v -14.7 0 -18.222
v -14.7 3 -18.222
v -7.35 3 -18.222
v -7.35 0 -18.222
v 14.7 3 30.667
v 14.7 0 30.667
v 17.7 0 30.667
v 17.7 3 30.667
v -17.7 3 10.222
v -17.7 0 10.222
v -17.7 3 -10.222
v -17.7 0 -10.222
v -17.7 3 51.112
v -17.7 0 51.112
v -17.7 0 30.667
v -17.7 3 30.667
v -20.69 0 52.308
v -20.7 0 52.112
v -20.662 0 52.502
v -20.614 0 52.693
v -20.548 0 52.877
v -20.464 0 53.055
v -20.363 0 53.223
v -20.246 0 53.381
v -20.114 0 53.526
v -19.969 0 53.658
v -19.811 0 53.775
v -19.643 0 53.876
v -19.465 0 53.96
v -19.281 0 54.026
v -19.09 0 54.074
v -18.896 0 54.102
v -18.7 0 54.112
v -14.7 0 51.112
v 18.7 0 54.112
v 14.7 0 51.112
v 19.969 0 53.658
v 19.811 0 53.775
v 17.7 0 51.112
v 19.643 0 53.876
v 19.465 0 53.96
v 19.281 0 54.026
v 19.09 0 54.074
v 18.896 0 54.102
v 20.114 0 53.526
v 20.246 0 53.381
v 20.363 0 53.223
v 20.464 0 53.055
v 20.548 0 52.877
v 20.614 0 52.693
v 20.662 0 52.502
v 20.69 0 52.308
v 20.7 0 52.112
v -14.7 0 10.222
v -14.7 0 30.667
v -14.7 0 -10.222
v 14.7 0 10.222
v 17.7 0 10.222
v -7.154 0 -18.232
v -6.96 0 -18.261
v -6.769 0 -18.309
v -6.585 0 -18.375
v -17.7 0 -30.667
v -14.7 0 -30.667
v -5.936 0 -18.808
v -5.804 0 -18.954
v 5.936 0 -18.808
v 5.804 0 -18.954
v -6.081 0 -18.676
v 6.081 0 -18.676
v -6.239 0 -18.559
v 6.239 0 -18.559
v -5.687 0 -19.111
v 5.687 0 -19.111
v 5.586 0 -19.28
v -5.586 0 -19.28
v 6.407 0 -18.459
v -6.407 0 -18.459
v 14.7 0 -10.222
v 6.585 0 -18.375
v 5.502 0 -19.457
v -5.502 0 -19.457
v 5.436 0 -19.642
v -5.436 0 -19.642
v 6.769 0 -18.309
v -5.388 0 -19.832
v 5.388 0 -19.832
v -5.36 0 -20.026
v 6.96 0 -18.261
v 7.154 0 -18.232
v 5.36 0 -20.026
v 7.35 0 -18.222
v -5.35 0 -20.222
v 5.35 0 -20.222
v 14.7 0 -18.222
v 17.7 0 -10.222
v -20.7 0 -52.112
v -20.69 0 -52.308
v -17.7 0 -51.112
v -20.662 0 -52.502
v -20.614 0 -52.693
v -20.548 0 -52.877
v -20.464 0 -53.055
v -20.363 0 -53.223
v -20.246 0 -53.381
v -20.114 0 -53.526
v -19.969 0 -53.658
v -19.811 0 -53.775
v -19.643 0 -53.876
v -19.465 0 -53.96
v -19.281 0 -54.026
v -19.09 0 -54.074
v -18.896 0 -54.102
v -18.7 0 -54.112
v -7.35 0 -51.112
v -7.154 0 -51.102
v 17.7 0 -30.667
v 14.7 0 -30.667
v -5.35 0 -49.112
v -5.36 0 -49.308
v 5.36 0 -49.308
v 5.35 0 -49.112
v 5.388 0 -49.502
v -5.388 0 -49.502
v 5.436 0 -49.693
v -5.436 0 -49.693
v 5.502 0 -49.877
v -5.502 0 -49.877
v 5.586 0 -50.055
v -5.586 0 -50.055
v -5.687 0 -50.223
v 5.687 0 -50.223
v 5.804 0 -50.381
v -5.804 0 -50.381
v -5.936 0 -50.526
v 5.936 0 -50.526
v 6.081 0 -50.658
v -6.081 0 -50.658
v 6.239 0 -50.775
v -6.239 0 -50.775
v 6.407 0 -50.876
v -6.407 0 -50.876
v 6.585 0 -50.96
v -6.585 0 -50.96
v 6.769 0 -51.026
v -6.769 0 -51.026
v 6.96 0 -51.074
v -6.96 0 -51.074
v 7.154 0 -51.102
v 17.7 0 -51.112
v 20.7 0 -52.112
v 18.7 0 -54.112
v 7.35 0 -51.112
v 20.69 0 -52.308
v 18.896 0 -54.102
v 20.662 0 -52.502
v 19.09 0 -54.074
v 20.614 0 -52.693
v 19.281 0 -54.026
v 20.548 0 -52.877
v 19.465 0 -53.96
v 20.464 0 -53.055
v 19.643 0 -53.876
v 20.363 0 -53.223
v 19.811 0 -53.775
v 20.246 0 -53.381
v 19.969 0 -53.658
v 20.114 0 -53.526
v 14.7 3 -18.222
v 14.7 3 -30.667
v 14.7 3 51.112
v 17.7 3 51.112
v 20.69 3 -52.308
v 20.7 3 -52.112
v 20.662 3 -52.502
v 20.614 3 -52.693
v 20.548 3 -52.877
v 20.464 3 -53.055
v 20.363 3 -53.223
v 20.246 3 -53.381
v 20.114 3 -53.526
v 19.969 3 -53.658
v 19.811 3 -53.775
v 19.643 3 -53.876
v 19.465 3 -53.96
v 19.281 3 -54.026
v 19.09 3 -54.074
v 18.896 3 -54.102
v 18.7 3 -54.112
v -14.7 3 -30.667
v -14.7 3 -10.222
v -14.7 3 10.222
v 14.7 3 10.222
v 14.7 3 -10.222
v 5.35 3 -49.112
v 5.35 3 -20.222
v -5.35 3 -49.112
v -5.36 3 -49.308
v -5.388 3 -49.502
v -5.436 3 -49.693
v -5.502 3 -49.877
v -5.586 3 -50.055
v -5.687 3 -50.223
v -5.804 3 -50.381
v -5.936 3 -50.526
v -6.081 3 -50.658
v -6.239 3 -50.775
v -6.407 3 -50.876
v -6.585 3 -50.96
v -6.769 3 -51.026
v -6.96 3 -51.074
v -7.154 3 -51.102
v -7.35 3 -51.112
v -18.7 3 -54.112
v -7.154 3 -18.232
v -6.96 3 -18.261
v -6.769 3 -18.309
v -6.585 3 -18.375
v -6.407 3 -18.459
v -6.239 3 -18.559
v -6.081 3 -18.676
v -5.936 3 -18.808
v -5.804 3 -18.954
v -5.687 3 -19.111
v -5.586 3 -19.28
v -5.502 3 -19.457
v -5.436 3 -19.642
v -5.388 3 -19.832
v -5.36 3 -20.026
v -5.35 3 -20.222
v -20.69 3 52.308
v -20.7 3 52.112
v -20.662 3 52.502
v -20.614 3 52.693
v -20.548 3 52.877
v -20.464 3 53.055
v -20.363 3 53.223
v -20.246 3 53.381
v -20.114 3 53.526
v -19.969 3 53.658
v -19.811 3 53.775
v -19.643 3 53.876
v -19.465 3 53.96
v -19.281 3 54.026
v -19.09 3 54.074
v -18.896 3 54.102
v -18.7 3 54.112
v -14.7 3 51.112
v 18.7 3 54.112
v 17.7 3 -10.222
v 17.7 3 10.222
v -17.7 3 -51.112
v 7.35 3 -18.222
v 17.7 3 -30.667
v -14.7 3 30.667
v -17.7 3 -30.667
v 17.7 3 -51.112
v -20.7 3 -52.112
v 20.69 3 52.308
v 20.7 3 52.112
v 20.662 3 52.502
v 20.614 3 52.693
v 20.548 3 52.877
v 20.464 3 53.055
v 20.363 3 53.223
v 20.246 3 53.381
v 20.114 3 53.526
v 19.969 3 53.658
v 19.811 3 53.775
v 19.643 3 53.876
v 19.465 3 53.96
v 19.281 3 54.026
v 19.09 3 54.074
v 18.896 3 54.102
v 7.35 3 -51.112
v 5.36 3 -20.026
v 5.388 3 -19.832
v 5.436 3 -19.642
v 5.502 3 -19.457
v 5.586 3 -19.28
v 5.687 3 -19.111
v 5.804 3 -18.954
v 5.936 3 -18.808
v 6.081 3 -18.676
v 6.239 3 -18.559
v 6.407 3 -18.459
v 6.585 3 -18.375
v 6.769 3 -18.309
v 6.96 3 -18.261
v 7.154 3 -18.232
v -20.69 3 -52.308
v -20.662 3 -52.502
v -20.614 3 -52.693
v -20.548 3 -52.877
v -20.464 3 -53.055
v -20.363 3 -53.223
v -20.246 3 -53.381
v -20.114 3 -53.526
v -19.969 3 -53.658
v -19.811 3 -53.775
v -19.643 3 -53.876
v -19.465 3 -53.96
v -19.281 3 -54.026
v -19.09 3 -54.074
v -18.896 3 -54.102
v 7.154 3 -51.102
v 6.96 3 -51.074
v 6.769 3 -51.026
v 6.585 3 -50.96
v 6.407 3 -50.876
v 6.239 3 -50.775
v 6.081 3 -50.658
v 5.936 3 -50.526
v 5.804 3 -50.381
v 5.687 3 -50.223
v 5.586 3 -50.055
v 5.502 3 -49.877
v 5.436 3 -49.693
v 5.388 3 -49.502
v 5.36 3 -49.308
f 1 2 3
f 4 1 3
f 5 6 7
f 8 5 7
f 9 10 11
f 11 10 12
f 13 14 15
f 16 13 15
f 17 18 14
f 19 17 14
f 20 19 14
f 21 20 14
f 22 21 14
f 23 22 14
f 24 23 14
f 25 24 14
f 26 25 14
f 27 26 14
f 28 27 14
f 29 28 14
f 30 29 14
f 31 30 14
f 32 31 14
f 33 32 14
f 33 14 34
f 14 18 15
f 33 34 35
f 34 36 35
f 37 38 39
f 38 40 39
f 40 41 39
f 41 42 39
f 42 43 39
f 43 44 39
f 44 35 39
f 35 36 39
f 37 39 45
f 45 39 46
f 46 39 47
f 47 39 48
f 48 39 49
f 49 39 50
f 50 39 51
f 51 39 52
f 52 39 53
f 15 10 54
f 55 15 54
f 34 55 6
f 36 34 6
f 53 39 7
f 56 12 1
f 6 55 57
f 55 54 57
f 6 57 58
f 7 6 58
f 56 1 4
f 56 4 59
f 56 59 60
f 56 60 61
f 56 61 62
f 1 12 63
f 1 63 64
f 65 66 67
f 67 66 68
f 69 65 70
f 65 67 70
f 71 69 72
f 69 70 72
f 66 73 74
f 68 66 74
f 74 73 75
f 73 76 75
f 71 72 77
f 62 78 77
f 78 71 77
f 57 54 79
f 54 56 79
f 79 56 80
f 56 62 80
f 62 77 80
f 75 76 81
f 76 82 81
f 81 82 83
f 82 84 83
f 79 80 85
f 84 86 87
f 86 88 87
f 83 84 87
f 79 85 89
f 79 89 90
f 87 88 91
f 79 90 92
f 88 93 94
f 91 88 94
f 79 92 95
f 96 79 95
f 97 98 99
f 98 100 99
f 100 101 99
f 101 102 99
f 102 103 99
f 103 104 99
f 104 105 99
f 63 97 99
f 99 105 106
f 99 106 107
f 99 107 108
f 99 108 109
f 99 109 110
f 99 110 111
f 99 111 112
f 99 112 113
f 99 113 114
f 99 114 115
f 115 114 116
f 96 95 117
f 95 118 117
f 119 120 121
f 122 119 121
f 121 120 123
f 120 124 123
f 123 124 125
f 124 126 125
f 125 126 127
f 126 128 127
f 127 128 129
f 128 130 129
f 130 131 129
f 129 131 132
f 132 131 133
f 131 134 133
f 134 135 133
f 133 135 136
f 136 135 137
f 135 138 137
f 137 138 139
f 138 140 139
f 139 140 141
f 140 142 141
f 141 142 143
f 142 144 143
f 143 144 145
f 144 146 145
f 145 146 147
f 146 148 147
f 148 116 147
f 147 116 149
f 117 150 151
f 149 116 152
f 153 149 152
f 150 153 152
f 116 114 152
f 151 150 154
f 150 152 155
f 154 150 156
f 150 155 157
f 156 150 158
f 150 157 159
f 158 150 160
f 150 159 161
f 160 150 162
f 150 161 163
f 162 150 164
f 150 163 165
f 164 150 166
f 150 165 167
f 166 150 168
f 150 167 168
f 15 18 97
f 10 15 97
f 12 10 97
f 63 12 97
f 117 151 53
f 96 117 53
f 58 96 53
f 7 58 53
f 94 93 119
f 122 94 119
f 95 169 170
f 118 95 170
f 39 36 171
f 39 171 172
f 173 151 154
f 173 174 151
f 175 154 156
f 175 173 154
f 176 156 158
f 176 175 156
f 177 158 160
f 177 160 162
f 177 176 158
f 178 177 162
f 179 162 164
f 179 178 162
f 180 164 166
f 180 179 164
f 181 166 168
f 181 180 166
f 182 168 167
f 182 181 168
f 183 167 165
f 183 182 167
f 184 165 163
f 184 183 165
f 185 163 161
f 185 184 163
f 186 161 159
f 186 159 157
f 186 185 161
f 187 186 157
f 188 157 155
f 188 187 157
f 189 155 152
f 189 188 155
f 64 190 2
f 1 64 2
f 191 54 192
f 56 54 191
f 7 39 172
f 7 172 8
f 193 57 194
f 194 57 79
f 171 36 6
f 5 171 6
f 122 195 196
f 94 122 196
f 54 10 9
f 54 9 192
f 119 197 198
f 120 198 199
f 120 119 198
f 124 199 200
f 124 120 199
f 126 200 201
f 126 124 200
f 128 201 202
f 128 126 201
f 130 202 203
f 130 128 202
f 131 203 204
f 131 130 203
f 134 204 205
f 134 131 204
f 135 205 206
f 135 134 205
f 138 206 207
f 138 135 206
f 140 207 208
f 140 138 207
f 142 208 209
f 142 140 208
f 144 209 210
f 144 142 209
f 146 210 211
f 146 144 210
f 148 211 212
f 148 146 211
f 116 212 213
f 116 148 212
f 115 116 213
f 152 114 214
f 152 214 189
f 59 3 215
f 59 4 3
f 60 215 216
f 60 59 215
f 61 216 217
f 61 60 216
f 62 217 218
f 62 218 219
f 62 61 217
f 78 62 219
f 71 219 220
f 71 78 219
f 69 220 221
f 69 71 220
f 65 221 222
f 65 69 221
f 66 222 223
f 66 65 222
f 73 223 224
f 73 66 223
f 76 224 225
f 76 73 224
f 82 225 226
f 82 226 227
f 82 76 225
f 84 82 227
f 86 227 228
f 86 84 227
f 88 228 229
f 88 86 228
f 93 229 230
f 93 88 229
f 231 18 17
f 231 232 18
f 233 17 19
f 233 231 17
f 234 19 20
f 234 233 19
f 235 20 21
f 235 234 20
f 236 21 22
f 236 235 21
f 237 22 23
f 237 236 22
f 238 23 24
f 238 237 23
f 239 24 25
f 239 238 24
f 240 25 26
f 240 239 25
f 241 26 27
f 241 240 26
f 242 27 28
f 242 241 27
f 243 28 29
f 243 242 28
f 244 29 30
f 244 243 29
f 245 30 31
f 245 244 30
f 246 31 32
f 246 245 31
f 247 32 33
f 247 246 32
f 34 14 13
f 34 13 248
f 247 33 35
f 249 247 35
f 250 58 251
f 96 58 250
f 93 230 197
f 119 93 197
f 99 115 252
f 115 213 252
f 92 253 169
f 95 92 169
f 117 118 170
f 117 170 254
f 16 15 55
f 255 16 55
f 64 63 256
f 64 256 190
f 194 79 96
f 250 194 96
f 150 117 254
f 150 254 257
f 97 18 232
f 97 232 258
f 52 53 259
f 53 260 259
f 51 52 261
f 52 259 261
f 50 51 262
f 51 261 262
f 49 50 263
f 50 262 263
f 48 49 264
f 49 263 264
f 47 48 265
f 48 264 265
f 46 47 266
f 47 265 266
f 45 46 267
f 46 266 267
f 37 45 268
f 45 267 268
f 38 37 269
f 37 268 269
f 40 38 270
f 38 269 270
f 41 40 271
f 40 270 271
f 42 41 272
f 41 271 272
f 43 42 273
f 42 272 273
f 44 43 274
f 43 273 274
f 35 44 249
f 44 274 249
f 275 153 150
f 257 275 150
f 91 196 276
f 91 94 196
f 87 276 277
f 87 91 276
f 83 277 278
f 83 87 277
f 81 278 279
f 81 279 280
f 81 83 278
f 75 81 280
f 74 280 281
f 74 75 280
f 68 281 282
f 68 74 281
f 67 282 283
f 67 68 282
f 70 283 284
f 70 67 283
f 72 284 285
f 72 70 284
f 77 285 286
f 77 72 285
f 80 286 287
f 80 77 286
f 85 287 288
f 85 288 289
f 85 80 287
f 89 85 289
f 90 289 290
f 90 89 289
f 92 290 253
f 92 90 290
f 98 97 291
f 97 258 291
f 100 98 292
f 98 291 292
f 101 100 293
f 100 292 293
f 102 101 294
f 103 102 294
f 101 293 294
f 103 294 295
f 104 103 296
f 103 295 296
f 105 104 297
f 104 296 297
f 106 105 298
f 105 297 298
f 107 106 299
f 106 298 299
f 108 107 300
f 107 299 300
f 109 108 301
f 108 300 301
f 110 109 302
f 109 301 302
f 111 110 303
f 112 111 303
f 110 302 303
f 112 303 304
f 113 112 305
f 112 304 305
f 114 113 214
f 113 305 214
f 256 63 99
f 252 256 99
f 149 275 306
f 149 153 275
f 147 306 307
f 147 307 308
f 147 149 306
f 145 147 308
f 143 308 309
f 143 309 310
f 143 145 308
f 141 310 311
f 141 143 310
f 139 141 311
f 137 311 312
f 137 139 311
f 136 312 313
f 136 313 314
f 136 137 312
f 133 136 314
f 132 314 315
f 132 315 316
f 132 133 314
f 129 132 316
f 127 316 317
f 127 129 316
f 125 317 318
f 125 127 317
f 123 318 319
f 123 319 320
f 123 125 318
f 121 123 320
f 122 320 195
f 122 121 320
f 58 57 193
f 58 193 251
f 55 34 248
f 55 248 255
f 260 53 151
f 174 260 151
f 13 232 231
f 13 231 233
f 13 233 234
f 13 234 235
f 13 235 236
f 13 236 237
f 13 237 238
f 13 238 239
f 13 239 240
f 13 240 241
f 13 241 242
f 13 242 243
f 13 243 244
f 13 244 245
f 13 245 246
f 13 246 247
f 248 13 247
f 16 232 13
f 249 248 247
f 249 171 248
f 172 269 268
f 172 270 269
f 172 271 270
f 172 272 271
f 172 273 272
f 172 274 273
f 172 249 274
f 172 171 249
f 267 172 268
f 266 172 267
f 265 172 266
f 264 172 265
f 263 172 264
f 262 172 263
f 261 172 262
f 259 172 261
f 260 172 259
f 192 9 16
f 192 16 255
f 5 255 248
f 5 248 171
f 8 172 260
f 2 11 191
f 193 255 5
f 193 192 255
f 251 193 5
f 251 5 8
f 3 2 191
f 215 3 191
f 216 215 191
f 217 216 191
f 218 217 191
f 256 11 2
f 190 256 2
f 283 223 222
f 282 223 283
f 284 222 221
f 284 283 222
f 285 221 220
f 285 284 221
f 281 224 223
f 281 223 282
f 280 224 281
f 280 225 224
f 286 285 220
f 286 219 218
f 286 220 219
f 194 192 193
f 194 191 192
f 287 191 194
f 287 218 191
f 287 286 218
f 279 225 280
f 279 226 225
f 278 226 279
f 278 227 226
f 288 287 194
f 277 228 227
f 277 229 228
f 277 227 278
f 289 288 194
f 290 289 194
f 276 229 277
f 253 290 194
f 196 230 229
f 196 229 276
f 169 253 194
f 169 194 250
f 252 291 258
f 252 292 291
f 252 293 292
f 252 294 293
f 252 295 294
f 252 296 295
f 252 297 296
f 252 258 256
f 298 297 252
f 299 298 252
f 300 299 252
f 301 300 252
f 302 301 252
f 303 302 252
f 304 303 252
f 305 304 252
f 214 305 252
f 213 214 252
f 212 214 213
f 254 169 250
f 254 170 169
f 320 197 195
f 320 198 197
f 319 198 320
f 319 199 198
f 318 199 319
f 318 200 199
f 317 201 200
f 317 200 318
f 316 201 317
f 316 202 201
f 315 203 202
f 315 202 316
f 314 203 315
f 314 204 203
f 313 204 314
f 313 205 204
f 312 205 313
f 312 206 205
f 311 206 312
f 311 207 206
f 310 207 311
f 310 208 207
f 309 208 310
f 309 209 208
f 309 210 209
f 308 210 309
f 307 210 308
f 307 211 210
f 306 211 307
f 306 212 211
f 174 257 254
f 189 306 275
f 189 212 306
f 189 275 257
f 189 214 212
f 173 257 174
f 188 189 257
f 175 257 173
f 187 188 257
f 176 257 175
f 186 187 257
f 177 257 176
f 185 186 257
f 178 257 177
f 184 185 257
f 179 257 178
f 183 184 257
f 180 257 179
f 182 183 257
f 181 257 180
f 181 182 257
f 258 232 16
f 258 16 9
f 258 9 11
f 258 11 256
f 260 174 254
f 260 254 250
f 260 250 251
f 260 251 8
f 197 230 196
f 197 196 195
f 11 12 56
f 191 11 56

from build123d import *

# Parameters (mm, degrees)
SKETCH1_W               = 41.4
SKETCH1_H               = 108.224
SKETCH1_W_2             = 3
SKETCH1_H_2             = 20.4448
BOSS_EXTRUDE1_DEPTH     = 3
CUT_EXTRUDE1_DEPTH      = 1
CUT_EXTRUDE1_DEPTH_BACK = 4
FILLET1_R               = 2


with BuildPart() as part:
    # Sketch1 → Boss-Extrude1 (new body)
    with BuildSketch(Plane(origin=(0, 0, 0), x_dir=(1, 0, 0), z_dir=(0, 1, 0))):
        Rectangle(SKETCH1_W, SKETCH1_H)
        with Locations((16.2, 40.8896)):
            Rectangle(SKETCH1_W_2, SKETCH1_H_2, mode=Mode.SUBTRACT)
        with Locations((16.2, 0)):
            Rectangle(SKETCH1_W_2, SKETCH1_H_2, mode=Mode.SUBTRACT)
        with Locations((16.2, -40.8896)):
            Rectangle(SKETCH1_W_2, SKETCH1_H_2, mode=Mode.SUBTRACT)
        with Locations((-16.2, -40.8896)):
            Rectangle(SKETCH1_W_2, SKETCH1_H_2, mode=Mode.SUBTRACT)
        with Locations((-16.2, 0)):
            Rectangle(SKETCH1_W_2, SKETCH1_H_2, mode=Mode.SUBTRACT)
        with Locations((-16.2, 40.8896)):
            Rectangle(SKETCH1_W_2, SKETCH1_H_2, mode=Mode.SUBTRACT)
    extrude(amount=BOSS_EXTRUDE1_DEPTH)

    # Sketch2 → Cut-Extrude1 (cut, two sides)
    with BuildSketch(Plane(origin=(0, 3, 0), x_dir=(1, 0, 0), z_dir=(0, 1, 0))) as cut_extrude1_sk:
        Polygon((-5.35, 51.112), (-14.7, 51.112), (-14.7, 30.6672), (-14.7, 18.2224), (-5.35, 18.2224), align=None)
        Polygon((14.7, 51.112), (5.35, 51.112), (5.35, 18.2224), (14.7, 18.2224), (14.7, 30.6672), align=None)
    extrude(amount=CUT_EXTRUDE1_DEPTH, mode=Mode.SUBTRACT)
    extrude(cut_extrude1_sk.sketch, amount=-CUT_EXTRUDE1_DEPTH_BACK, mode=Mode.SUBTRACT)

    # Fillet1
    fillet1_edges = [part.edges().sort_by_distance(p)[0] for p in [
        (-5.35, 1.5, -18.2224),
        (-5.35, 1.5, -51.112),
        (5.35, 1.5, -18.2224),
        (5.35, 1.5, -51.112),
        (20.7, 1.5, 54.112),
        (-20.7, 1.5, 54.112),
        (-20.7, 1.5, -54.112),
        (20.7, 1.5, -54.112),
    ]]
    fillet(fillet1_edges, radius=FILLET1_R)


solid = part.part
